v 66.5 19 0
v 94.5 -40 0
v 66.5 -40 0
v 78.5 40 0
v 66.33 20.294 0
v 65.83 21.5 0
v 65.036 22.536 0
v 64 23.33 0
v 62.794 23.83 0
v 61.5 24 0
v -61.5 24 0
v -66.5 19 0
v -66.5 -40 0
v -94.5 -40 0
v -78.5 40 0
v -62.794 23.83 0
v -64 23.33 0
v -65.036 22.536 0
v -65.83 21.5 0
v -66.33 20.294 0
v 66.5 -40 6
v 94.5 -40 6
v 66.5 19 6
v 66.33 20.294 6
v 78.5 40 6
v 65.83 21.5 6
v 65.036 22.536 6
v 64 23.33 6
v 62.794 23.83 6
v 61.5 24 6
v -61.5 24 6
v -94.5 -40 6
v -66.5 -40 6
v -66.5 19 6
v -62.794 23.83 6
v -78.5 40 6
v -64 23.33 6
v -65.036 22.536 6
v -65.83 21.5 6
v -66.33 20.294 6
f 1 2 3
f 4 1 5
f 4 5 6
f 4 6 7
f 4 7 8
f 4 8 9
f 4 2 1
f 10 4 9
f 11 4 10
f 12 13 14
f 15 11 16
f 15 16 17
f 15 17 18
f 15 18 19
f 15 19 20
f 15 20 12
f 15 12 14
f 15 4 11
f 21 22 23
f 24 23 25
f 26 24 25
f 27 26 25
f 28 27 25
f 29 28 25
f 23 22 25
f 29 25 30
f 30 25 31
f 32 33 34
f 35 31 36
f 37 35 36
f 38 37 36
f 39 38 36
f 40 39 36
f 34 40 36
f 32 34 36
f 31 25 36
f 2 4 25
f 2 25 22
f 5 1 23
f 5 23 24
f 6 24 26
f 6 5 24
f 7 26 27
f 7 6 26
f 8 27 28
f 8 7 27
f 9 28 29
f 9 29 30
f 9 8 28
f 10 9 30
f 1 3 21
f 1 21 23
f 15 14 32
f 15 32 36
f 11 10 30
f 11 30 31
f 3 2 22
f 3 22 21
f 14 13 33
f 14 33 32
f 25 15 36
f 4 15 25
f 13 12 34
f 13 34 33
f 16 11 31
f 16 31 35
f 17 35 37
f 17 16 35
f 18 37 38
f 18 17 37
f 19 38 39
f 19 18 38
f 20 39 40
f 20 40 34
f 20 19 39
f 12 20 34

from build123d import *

# Parameters (mm, degrees)
RESSALTO_EXTRUS_O1_DEPTH = 6


with BuildPart() as part:
    # Esboço1 → Ressalto-extrusão1 (new body)
    with BuildSketch(Plane.XY):
        with BuildLine():
            Line((-66.5, -40), (-94.5, -40))
            Line((-94.5, -40), (-78.5, 40))
            Line((-78.5, 40), (78.5, 40))
            Line((78.5, 40), (94.5, -40))
            Line((94.5, -40), (66.5, -40))
            Line((66.5, -40), (66.5, 19))
            ThreePointArc((66.5, 19), (65.035533906, 22.535533906), (61.5, 24))
            Line((61.5, 24), (-61.5, 24))
            ThreePointArc((-61.5, 24), (-65.035533906, 22.535533906), (-66.5, 19))
            Line((-66.5, 19), (-66.5, -40))
        make_face()
    extrude(amount=RESSALTO_EXTRUS_O1_DEPTH)


solid = part.part
